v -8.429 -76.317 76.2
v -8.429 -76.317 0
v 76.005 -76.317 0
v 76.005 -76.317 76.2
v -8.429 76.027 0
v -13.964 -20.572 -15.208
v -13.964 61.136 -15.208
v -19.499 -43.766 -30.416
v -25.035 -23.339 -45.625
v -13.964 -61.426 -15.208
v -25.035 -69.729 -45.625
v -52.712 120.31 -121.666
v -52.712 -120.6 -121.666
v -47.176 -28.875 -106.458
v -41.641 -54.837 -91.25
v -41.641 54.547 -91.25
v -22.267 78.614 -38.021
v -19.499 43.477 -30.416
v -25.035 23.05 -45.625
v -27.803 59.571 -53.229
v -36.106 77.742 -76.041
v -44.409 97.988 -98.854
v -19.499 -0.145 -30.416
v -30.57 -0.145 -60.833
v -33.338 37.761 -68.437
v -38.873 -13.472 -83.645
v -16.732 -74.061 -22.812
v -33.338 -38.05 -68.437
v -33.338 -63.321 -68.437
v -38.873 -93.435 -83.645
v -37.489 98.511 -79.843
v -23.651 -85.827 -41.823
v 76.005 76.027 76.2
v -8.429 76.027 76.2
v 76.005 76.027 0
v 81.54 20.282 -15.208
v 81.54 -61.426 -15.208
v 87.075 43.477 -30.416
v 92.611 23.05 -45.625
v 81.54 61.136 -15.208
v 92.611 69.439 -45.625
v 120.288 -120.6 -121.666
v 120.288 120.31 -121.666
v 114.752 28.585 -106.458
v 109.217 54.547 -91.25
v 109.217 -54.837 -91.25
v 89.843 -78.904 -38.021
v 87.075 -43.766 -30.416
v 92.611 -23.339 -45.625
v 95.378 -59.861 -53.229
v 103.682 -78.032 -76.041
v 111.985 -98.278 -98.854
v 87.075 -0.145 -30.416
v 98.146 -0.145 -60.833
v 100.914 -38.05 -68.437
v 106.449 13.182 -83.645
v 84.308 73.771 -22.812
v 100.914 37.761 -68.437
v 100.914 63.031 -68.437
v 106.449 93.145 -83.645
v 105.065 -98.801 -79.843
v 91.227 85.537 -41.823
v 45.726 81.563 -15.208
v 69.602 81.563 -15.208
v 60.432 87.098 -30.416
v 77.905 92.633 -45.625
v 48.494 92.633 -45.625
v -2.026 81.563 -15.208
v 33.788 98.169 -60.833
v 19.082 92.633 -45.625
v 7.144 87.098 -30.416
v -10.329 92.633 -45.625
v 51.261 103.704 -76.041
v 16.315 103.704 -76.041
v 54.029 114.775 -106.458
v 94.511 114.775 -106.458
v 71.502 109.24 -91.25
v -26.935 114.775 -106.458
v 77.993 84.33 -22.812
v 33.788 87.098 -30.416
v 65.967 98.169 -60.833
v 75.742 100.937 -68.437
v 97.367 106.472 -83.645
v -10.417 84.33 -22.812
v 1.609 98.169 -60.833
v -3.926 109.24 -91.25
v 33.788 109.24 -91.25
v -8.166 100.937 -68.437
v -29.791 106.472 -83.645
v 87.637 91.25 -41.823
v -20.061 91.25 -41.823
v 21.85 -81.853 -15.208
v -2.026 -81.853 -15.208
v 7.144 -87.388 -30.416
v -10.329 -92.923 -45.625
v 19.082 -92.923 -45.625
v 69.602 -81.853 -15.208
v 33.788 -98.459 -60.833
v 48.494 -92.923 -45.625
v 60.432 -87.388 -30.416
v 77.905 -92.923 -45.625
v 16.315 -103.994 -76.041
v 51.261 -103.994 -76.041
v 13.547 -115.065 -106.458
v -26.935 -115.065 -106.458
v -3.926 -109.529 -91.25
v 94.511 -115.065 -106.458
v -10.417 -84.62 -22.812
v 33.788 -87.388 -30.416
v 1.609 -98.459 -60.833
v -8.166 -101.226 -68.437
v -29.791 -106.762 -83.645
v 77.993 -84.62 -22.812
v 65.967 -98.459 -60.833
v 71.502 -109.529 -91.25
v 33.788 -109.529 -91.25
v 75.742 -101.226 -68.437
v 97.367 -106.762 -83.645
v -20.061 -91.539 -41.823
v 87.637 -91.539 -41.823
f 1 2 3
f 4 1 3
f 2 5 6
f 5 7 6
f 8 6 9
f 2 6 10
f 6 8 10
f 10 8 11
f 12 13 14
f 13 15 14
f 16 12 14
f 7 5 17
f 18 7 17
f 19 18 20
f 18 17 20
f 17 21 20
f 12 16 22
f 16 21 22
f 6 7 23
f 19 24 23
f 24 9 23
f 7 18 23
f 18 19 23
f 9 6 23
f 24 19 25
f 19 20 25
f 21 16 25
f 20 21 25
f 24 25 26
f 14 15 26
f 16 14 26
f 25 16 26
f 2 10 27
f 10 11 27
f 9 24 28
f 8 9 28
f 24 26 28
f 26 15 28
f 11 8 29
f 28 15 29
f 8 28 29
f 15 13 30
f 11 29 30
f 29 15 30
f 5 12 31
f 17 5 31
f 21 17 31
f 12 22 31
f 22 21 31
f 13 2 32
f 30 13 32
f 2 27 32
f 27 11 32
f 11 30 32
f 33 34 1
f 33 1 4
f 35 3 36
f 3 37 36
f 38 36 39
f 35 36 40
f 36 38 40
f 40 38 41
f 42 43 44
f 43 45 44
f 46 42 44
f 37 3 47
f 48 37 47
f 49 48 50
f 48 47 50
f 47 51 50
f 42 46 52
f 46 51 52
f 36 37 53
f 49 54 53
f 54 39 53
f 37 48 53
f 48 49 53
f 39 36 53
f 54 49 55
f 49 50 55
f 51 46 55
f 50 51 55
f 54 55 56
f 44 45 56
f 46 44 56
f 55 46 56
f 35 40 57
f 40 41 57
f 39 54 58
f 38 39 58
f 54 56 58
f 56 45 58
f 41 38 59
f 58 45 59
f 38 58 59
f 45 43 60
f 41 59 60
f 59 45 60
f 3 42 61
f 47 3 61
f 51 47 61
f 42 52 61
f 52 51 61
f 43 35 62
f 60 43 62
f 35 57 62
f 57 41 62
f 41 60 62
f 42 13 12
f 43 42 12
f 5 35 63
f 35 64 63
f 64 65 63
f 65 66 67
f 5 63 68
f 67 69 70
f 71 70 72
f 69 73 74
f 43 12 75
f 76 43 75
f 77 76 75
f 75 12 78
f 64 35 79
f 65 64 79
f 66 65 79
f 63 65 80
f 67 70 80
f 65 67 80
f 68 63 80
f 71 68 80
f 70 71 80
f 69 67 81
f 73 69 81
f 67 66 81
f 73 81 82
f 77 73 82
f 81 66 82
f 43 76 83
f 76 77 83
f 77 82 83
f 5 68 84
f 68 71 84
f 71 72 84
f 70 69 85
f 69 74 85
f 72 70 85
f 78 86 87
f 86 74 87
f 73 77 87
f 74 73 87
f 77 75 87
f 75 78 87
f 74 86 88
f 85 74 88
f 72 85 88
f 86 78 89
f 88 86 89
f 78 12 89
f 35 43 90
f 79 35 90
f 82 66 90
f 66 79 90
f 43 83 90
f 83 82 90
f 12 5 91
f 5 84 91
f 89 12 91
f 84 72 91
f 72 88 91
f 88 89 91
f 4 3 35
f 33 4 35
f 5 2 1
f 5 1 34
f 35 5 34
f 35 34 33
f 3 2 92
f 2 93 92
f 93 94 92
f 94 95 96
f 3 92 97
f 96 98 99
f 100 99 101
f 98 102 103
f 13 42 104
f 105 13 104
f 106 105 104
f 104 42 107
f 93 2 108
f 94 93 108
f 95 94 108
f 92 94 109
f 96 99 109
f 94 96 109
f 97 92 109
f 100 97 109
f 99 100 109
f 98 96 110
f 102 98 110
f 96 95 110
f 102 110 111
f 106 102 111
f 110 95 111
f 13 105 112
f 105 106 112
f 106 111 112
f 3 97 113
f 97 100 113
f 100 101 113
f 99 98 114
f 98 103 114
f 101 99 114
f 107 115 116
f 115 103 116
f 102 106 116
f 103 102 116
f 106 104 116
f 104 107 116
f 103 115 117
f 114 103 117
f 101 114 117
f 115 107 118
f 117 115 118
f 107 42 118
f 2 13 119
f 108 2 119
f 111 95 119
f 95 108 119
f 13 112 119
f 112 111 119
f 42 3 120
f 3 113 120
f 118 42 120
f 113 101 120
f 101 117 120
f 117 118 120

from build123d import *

# Parameters (mm, degrees)
F0_W          = 84.4335490838
F0_H          = 152.3446664214
F1_DEPTH      = 76.2
F1_DEPTH_BACK = 121.666
F1_TAPER_BACK = -20


with BuildPart() as f1:
    # F0 (on Top) → F1 (new body, two sides)
    with BuildSketch(Plane.XY) as f1_sk:
        with Locations((33.7879988365, -0.1448951662)):
            Rectangle(F0_W, F0_H)
    extrude(amount=F1_DEPTH)
    extrude(f1_sk.sketch, amount=-F1_DEPTH_BACK, taper=F1_TAPER_BACK)


solid = f1.part
